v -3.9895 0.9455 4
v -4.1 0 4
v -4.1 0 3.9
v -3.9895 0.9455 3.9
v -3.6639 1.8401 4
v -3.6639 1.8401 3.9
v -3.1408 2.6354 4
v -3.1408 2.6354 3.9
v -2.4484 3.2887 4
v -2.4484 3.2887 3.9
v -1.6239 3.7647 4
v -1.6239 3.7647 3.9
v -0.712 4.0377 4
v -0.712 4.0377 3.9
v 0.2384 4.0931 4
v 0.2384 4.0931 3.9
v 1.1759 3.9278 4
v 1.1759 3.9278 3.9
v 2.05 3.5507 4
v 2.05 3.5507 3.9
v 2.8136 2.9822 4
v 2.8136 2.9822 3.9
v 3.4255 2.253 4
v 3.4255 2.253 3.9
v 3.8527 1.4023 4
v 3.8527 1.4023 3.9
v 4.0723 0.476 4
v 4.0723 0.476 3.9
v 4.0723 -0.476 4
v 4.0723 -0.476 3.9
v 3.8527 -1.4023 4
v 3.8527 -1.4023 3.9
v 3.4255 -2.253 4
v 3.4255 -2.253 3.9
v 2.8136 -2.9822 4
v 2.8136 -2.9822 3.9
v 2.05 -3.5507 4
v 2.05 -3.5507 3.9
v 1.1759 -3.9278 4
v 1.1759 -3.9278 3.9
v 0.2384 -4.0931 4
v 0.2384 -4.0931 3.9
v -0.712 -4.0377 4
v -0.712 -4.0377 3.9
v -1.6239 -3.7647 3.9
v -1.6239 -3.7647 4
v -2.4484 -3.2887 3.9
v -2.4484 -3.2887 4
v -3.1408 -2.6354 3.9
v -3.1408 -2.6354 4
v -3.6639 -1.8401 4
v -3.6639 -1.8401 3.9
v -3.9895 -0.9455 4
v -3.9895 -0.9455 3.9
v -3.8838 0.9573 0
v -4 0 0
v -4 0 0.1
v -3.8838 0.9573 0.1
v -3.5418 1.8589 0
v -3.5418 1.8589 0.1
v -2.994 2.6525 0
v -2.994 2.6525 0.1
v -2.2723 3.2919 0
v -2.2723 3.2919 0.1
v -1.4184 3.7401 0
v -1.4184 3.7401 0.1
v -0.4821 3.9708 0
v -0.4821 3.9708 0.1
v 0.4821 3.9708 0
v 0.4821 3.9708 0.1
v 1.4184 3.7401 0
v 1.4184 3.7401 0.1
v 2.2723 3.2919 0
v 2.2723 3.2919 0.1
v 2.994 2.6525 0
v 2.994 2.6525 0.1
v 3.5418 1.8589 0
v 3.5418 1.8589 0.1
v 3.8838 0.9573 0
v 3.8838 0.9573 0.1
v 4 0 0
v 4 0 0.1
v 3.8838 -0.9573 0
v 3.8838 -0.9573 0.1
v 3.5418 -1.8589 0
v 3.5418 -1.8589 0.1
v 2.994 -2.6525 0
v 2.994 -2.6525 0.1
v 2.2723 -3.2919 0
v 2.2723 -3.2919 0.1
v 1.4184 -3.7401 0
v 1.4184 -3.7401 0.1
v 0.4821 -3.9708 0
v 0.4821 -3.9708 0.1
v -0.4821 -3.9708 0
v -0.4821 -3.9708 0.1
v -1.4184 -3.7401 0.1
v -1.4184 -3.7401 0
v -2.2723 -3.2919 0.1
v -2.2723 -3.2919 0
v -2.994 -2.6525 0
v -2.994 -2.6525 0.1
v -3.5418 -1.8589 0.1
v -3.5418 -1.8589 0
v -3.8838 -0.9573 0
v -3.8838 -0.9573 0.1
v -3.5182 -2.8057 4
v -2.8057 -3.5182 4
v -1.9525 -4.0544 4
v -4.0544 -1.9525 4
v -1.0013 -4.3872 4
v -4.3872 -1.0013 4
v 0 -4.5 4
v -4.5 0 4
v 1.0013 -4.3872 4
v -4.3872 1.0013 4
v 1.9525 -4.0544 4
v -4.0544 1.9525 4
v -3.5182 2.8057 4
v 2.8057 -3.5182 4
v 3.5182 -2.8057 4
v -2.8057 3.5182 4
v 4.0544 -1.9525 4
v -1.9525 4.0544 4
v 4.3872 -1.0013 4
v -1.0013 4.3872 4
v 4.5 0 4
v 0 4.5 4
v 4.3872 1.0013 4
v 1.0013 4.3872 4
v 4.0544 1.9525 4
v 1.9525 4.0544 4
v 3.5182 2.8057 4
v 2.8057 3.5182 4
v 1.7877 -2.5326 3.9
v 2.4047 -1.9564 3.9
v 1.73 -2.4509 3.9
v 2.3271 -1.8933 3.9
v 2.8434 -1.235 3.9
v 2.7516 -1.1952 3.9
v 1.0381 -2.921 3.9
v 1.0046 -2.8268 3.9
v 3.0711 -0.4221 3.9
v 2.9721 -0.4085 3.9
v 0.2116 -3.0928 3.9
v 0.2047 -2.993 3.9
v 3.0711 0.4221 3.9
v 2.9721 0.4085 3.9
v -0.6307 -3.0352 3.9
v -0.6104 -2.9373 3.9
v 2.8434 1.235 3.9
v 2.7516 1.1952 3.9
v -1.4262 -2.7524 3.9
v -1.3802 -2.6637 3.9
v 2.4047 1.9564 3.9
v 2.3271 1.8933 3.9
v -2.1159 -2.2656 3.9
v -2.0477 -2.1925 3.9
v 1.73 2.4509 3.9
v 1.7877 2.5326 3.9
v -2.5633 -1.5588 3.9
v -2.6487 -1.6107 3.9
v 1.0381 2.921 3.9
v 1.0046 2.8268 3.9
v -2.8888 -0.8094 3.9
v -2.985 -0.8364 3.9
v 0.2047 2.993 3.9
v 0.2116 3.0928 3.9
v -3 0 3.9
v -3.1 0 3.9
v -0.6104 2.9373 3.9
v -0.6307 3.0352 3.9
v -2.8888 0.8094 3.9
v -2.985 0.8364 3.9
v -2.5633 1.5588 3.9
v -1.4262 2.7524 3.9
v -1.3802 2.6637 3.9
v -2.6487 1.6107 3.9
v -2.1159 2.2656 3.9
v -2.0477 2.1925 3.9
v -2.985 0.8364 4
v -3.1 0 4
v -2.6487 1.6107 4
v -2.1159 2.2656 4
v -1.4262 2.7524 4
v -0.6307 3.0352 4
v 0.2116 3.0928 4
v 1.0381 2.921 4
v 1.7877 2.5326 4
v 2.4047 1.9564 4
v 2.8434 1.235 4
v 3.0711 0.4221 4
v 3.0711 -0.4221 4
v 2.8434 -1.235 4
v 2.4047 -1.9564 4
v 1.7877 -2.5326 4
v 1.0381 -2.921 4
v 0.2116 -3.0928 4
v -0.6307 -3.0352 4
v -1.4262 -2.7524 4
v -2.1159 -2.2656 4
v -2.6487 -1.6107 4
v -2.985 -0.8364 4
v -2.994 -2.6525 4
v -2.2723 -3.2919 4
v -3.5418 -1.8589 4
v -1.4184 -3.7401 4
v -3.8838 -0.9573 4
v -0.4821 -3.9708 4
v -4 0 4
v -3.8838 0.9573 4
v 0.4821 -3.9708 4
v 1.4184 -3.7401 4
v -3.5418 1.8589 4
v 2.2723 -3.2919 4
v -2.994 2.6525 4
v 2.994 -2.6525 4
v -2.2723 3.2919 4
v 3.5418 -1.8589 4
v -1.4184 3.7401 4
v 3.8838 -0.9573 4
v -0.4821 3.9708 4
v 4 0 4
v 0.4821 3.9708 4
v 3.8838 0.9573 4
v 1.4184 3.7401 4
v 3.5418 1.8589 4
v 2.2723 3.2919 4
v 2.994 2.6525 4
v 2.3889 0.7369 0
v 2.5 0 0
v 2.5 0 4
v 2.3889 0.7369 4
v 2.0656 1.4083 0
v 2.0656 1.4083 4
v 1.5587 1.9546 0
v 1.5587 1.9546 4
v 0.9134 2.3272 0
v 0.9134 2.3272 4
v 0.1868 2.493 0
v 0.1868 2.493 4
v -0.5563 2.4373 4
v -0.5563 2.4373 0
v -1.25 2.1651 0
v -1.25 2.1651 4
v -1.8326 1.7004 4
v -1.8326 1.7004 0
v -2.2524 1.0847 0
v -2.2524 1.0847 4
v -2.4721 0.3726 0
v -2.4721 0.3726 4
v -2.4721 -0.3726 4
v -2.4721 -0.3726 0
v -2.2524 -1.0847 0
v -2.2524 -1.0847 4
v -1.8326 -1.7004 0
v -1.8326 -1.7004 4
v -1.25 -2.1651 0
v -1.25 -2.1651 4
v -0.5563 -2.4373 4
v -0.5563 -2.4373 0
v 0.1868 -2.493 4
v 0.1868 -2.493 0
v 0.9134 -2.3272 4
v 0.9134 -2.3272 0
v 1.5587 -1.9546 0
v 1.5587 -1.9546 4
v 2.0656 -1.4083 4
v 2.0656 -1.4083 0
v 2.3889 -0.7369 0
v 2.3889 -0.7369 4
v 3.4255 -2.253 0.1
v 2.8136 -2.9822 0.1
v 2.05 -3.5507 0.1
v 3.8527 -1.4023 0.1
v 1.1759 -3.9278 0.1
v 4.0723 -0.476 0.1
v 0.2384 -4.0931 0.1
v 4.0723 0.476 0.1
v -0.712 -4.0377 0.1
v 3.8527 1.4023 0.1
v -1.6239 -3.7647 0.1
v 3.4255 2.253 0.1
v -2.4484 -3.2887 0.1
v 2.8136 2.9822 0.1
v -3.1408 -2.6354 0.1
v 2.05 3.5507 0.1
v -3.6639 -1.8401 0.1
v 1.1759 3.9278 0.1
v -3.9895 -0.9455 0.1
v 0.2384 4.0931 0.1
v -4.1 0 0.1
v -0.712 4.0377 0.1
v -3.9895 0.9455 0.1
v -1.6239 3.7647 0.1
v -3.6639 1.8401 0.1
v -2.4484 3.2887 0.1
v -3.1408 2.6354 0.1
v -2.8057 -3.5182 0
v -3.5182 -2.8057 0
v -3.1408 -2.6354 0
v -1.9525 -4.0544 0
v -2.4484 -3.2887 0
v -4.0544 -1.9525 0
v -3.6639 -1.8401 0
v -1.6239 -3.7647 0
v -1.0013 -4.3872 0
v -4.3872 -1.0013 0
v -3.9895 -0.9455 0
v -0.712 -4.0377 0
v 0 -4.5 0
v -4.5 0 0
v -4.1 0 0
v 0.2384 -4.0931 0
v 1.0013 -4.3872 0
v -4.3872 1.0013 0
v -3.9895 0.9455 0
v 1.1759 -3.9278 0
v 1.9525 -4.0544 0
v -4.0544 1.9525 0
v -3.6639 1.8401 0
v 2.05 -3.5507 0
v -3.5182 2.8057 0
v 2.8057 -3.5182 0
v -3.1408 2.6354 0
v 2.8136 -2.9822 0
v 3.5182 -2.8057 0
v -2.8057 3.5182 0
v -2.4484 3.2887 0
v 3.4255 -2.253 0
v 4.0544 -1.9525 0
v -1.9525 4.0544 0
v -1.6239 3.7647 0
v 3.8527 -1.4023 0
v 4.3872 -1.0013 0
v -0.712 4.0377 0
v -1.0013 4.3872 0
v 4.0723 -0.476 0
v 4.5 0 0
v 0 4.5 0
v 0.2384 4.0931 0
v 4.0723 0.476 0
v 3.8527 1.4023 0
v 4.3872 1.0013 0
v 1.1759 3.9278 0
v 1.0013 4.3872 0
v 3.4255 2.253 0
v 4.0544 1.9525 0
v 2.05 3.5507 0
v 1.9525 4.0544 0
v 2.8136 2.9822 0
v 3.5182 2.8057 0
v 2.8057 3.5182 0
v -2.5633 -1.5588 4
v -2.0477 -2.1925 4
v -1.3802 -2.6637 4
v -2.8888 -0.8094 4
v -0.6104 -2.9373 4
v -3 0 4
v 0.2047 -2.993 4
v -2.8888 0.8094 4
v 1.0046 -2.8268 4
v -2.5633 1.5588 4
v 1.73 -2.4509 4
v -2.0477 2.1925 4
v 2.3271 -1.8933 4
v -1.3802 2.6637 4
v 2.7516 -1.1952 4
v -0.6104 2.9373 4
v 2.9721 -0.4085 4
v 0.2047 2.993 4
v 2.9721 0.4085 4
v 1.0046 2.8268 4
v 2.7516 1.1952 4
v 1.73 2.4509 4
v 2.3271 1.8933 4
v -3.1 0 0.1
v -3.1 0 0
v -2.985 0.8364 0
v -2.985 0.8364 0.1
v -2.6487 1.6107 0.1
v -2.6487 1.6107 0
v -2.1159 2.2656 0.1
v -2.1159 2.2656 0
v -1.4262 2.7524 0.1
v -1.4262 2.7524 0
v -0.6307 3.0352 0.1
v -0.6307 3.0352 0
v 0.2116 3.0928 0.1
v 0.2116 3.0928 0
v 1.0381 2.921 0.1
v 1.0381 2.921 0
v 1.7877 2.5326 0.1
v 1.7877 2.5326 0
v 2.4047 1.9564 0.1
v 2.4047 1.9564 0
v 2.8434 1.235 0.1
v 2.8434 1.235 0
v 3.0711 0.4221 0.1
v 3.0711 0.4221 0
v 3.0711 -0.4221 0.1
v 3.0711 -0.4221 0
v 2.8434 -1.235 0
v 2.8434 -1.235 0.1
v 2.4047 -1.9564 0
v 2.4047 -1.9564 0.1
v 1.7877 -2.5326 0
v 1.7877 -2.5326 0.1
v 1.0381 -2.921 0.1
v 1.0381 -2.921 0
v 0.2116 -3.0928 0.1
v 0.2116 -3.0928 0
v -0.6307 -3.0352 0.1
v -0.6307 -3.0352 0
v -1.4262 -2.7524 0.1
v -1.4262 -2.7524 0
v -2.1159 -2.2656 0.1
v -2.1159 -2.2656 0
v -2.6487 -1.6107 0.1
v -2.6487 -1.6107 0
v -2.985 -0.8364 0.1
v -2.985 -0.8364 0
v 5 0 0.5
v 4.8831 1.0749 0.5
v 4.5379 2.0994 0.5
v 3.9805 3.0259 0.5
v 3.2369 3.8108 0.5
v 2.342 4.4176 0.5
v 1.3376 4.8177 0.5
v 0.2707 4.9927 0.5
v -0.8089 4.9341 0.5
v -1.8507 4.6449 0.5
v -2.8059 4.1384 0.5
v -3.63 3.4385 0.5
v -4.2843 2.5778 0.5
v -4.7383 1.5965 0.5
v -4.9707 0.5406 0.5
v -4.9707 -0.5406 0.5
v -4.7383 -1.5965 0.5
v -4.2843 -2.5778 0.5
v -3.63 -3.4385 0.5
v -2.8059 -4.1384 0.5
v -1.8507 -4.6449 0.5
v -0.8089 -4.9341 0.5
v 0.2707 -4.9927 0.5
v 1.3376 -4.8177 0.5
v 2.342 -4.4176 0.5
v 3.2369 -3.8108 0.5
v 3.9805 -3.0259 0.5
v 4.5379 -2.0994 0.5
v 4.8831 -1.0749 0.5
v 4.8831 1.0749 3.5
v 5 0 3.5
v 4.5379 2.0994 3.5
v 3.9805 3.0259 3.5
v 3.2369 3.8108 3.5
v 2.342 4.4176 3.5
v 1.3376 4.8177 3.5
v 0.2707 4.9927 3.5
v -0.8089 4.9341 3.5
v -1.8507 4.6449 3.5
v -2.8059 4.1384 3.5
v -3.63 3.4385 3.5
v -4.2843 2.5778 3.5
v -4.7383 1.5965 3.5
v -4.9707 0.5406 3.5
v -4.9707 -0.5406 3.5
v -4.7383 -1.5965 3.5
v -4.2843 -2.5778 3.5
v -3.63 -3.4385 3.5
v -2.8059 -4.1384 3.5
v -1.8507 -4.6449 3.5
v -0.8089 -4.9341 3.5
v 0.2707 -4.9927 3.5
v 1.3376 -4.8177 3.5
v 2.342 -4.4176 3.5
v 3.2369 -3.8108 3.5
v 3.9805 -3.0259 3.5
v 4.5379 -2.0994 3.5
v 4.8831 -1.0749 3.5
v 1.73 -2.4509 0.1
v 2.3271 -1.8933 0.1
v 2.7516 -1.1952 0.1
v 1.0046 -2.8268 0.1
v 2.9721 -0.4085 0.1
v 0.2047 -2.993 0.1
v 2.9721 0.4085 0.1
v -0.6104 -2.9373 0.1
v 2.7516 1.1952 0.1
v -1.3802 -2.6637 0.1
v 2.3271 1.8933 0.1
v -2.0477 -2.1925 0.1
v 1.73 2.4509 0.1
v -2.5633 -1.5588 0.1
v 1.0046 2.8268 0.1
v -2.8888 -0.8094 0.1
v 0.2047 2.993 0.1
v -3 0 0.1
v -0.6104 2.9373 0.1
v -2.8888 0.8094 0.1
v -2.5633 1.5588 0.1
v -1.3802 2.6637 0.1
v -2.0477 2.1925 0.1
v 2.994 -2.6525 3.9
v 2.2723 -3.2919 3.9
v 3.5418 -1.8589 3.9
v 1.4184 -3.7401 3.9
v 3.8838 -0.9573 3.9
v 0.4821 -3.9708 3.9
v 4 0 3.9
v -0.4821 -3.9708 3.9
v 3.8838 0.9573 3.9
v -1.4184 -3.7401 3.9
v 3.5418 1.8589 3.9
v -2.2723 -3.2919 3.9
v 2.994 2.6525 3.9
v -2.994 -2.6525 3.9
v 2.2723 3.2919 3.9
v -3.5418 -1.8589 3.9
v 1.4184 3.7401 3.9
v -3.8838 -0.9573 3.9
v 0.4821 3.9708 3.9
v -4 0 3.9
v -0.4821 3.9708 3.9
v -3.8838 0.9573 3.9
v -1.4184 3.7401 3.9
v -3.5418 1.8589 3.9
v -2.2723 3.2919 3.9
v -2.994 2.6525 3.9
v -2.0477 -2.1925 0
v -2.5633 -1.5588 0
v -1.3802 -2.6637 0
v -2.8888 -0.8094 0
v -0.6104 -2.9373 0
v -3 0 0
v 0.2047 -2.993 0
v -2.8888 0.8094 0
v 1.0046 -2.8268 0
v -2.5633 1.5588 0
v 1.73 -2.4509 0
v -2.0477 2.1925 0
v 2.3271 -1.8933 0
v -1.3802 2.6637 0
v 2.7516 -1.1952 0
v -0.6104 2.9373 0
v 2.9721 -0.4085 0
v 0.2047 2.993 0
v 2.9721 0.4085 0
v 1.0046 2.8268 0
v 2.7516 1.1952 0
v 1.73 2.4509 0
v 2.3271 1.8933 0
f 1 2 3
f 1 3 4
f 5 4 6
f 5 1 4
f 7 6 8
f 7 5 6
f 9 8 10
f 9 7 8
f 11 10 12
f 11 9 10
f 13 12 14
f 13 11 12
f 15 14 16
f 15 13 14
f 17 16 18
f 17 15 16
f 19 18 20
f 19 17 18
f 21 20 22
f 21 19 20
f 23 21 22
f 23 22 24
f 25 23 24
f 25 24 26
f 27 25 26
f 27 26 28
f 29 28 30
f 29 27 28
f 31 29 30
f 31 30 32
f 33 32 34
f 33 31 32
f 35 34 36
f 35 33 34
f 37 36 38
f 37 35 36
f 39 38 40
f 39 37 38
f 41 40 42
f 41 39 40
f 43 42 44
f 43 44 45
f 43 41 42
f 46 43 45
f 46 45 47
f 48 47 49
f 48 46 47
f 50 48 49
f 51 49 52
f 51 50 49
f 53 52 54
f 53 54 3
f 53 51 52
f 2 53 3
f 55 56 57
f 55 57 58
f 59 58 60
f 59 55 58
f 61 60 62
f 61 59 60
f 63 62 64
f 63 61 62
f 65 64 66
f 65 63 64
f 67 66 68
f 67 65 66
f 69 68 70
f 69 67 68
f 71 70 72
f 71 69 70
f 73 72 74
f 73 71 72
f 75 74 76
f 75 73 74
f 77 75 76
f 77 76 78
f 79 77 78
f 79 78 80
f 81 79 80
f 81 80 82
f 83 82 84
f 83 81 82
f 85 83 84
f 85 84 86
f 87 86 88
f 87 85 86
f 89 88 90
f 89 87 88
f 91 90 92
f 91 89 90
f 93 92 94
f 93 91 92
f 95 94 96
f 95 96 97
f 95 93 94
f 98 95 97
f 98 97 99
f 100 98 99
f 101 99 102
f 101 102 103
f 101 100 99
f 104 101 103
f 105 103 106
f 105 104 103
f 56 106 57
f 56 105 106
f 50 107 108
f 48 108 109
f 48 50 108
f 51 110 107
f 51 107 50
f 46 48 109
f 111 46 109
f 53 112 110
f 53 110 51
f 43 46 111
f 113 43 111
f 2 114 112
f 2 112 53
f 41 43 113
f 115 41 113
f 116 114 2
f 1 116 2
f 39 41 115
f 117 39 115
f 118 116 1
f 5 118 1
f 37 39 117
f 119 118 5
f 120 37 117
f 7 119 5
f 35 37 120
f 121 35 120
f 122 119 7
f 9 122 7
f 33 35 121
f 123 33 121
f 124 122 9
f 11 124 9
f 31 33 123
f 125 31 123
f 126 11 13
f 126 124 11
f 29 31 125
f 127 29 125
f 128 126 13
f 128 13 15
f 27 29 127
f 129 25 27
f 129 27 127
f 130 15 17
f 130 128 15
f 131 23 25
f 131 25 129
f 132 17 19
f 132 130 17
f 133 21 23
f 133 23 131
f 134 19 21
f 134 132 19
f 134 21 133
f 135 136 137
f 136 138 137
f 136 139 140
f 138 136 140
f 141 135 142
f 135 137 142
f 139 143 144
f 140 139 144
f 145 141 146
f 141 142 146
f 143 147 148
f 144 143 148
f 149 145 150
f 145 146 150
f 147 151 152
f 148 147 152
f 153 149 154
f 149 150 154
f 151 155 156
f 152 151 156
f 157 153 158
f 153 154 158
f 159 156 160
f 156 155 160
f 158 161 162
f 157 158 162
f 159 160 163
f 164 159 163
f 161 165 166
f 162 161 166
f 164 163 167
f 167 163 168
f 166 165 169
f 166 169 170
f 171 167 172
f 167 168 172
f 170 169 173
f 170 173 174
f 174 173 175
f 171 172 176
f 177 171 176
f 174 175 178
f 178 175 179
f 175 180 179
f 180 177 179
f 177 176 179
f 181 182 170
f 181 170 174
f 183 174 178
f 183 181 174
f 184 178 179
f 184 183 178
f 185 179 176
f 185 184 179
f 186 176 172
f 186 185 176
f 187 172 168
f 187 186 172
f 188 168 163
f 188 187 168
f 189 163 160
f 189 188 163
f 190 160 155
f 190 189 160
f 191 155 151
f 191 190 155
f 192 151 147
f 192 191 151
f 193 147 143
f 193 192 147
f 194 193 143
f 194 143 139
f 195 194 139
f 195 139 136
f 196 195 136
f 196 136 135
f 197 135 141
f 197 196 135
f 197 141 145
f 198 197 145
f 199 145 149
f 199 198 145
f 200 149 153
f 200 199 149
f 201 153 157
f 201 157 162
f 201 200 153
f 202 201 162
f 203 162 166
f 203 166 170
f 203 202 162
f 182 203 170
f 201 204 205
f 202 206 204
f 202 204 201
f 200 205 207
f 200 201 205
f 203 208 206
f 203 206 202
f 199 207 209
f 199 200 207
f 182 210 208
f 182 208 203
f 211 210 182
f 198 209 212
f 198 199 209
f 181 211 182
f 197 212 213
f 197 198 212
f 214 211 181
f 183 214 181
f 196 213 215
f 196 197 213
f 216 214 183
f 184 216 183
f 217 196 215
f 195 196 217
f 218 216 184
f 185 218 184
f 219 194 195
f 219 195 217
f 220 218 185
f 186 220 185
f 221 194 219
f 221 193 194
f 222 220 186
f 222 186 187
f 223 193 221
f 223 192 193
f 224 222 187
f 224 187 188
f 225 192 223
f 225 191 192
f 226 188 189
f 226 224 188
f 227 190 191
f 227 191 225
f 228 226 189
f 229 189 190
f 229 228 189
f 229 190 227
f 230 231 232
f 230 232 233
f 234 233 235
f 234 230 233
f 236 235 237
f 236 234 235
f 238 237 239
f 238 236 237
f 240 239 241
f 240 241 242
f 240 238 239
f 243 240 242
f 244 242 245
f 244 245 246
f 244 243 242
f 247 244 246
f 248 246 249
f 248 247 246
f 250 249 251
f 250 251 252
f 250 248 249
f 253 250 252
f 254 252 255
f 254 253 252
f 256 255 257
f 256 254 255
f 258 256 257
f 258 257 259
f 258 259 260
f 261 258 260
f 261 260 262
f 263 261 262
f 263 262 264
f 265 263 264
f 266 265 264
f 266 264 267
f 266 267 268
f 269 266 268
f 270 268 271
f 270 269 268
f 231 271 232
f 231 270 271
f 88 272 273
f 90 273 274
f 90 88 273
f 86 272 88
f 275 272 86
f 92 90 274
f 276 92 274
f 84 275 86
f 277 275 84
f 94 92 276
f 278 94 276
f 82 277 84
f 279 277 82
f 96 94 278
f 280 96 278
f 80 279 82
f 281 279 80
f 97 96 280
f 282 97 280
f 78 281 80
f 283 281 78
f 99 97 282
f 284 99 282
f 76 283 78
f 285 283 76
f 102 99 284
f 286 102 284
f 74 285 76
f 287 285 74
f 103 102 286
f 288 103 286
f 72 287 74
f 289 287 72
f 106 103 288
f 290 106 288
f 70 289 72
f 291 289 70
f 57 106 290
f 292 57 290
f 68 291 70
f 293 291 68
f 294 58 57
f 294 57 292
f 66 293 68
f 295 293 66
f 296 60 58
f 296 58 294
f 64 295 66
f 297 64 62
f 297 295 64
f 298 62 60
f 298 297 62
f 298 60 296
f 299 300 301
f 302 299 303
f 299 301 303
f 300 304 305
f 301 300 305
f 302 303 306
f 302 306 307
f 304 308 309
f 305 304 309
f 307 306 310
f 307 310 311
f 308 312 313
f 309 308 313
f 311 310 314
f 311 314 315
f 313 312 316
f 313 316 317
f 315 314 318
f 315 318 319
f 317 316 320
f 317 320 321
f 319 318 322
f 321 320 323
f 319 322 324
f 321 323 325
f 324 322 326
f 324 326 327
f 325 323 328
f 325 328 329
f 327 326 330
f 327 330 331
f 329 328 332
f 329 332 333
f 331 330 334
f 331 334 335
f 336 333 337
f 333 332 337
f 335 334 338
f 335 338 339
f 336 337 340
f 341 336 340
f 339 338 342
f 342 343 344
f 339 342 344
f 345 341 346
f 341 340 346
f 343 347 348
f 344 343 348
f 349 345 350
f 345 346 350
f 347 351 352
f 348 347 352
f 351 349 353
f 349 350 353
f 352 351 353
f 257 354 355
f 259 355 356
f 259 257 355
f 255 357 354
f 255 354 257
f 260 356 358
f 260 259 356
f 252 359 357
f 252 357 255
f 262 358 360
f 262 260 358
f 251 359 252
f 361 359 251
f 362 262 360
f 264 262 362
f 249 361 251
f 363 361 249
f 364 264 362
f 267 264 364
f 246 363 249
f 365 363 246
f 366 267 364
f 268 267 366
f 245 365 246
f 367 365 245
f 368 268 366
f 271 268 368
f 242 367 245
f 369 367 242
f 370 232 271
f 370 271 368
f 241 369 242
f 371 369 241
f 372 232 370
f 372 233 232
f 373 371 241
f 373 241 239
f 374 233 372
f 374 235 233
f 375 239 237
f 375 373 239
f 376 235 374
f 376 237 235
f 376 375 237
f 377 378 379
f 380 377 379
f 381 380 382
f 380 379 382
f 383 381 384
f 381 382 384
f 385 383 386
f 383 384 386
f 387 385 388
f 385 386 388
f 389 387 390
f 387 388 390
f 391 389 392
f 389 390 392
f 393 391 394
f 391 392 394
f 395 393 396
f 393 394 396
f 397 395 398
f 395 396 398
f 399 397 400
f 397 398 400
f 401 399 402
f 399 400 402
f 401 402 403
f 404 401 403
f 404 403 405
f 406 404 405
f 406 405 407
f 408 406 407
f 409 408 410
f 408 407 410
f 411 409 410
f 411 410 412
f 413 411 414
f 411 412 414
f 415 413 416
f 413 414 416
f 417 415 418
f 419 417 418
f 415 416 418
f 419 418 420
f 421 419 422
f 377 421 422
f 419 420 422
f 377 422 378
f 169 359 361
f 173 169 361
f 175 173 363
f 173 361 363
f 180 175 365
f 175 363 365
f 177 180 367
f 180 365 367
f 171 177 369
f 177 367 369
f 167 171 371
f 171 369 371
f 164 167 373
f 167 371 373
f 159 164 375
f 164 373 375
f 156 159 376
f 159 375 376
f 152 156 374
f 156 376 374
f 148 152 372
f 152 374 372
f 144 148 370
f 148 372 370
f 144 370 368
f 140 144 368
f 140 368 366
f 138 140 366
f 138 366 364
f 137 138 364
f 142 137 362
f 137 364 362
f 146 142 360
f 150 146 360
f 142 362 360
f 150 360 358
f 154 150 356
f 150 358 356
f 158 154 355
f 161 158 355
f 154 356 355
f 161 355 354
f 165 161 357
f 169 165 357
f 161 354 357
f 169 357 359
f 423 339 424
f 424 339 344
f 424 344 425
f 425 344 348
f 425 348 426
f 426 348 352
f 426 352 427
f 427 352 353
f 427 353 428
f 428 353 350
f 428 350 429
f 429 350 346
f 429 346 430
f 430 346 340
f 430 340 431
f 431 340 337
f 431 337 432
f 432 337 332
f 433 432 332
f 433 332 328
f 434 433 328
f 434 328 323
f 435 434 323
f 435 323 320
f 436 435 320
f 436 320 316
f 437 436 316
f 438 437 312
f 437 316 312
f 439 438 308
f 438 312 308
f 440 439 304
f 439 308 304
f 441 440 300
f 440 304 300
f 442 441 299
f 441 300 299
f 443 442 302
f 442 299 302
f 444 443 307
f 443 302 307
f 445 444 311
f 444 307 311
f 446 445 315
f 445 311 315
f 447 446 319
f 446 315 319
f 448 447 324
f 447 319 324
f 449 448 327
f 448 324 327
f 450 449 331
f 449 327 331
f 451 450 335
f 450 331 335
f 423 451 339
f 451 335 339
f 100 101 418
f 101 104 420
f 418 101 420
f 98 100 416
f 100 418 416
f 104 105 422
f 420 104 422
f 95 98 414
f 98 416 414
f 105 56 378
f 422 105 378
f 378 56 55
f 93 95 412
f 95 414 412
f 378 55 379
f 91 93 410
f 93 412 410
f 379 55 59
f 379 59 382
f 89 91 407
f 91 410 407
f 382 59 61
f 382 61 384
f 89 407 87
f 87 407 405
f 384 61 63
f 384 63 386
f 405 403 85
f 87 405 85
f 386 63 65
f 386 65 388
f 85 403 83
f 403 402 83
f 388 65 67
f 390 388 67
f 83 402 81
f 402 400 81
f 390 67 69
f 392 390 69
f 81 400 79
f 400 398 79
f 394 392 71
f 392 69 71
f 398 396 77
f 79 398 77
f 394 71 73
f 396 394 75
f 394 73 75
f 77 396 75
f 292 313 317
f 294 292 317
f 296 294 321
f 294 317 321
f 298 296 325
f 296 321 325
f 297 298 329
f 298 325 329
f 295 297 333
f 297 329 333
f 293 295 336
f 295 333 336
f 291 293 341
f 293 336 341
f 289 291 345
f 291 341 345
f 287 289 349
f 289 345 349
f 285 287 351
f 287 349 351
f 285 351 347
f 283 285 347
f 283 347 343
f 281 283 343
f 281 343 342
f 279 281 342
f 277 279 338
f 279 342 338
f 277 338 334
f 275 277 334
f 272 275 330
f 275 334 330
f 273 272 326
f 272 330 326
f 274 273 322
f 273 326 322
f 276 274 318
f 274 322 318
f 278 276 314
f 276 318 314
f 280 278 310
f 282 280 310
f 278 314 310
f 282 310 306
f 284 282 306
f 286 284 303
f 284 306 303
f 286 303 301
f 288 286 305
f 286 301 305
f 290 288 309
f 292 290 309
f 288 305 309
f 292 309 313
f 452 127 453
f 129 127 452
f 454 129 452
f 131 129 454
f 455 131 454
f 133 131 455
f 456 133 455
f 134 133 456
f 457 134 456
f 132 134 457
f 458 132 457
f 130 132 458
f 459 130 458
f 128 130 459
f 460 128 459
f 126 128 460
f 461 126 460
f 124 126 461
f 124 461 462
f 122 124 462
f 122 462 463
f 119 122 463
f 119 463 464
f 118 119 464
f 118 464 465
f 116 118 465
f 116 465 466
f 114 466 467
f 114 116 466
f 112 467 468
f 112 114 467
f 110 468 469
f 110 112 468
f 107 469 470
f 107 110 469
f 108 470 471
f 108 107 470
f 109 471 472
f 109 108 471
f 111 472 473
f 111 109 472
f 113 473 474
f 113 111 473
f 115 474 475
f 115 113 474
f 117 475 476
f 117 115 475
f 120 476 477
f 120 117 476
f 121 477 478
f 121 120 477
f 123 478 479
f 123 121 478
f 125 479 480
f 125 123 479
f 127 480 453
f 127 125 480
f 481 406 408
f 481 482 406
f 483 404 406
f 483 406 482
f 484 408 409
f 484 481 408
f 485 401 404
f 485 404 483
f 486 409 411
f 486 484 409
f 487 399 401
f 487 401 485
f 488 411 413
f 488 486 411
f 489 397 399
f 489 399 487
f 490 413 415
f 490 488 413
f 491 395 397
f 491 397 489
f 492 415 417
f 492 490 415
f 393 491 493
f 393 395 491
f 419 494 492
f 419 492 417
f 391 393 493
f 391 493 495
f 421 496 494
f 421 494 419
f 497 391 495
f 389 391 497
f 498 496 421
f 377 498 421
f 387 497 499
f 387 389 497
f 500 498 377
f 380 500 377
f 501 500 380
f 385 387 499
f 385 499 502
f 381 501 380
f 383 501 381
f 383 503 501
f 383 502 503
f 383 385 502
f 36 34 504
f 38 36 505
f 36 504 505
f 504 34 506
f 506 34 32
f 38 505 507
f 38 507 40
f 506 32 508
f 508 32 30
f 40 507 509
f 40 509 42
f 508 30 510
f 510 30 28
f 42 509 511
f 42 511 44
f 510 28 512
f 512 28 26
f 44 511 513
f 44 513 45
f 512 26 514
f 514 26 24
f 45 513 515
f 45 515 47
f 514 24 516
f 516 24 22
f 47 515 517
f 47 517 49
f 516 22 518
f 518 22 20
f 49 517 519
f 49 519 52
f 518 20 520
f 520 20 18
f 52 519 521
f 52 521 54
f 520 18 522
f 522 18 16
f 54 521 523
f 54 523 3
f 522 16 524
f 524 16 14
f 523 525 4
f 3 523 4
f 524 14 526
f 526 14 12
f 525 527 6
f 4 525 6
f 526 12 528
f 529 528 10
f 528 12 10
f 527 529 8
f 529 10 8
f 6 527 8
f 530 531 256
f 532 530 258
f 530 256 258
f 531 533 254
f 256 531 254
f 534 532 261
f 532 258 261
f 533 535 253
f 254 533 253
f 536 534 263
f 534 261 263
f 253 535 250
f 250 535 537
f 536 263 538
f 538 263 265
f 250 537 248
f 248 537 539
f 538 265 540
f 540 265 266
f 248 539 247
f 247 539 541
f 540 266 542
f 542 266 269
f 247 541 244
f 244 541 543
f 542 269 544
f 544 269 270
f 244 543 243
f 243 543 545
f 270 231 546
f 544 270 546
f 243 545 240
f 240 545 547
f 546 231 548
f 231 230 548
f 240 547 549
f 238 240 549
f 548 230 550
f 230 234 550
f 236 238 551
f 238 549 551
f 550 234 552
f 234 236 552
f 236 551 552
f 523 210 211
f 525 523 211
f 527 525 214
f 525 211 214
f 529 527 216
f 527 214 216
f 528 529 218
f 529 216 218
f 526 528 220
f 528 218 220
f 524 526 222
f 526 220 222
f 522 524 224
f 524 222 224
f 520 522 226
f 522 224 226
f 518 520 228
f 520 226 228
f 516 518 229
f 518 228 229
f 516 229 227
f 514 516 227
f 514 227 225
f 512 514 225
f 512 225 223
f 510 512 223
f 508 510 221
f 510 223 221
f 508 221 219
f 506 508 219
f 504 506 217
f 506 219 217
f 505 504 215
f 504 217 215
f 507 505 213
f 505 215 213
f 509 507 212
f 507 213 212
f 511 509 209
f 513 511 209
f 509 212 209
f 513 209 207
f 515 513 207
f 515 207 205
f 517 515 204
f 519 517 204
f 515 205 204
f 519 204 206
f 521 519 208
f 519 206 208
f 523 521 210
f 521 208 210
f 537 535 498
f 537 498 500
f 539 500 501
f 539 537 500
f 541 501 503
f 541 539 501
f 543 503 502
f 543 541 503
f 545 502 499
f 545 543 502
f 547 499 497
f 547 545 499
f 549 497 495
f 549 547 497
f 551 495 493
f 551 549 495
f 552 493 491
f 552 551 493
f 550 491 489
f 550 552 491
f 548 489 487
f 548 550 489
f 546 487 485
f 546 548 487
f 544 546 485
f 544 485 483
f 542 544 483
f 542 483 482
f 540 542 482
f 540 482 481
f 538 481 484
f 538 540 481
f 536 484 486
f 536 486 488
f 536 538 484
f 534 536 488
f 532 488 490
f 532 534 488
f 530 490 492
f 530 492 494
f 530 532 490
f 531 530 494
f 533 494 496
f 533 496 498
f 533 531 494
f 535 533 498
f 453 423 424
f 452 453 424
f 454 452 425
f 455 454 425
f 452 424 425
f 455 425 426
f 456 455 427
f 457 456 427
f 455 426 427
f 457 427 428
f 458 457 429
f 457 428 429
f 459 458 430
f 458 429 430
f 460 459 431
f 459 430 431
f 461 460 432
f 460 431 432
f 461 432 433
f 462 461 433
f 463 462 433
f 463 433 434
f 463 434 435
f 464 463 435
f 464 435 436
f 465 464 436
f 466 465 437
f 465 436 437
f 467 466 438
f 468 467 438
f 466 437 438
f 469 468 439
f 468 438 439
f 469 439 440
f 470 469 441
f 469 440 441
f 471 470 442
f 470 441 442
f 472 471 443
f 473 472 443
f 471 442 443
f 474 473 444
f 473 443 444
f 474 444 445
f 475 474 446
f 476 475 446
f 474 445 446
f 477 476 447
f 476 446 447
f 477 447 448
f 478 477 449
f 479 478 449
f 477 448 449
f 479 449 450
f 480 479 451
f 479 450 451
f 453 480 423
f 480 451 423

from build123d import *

# Parameters (mm, degrees)
SKETCH1_R           = 5
SKETCH1_R_2         = 2.5
BOSS_EXTRUDE1_DEPTH = 4
CHAMFER1_SIZE       = 0.5
SKETCH2_R           = 4.1
SKETCH2_R_2         = 4
SKETCH2_R_3         = 3.1
SKETCH2_R_4         = 3
CUT_EXTRUDE1_DEPTH  = 0.1


with BuildPart() as part:
    # Sketch1 → Boss-Extrude1 (new body)
    with BuildSketch(Plane.XY):
        Circle(SKETCH1_R)
        Circle(SKETCH1_R_2, mode=Mode.SUBTRACT)
    extrude(amount=BOSS_EXTRUDE1_DEPTH)

    # Chamfer1
    chamfer1_edges = [part.edges().sort_by_distance(p)[0] for p in [
        (-5, 0, 0),
        (-5, 0, 4),
    ]]
    chamfer(chamfer1_edges, length=CHAMFER1_SIZE)

    # Sketch2 → Cut-Extrude1 (cut)
    # profile 1 of 2: a face of its own
    with BuildSketch(Plane(origin=(0, 0, 0), x_dir=(-1, 0, 0), z_dir=(0, 0, -1))):
        Circle(SKETCH2_R)
        Circle(SKETCH2_R_2, mode=Mode.SUBTRACT)
    # profile 2 of 2: a face of its own
    with BuildSketch(Plane(origin=(0, 0, 0), x_dir=(-1, 0, 0), z_dir=(0, 0, -1))):
        Circle(SKETCH2_R_3)
        Circle(SKETCH2_R_4, mode=Mode.SUBTRACT)
    cut_extrude1 = extrude(amount=-CUT_EXTRUDE1_DEPTH, mode=Mode.SUBTRACT)

    # Mirror1: Cut-Extrude1 across plane
    add(cut_extrude1.mirror(Plane(origin=(0, 0, 2), x_dir=(1, 0, 0), z_dir=(0, 0, -1))), mode=Mode.SUBTRACT)


solid = part.part
